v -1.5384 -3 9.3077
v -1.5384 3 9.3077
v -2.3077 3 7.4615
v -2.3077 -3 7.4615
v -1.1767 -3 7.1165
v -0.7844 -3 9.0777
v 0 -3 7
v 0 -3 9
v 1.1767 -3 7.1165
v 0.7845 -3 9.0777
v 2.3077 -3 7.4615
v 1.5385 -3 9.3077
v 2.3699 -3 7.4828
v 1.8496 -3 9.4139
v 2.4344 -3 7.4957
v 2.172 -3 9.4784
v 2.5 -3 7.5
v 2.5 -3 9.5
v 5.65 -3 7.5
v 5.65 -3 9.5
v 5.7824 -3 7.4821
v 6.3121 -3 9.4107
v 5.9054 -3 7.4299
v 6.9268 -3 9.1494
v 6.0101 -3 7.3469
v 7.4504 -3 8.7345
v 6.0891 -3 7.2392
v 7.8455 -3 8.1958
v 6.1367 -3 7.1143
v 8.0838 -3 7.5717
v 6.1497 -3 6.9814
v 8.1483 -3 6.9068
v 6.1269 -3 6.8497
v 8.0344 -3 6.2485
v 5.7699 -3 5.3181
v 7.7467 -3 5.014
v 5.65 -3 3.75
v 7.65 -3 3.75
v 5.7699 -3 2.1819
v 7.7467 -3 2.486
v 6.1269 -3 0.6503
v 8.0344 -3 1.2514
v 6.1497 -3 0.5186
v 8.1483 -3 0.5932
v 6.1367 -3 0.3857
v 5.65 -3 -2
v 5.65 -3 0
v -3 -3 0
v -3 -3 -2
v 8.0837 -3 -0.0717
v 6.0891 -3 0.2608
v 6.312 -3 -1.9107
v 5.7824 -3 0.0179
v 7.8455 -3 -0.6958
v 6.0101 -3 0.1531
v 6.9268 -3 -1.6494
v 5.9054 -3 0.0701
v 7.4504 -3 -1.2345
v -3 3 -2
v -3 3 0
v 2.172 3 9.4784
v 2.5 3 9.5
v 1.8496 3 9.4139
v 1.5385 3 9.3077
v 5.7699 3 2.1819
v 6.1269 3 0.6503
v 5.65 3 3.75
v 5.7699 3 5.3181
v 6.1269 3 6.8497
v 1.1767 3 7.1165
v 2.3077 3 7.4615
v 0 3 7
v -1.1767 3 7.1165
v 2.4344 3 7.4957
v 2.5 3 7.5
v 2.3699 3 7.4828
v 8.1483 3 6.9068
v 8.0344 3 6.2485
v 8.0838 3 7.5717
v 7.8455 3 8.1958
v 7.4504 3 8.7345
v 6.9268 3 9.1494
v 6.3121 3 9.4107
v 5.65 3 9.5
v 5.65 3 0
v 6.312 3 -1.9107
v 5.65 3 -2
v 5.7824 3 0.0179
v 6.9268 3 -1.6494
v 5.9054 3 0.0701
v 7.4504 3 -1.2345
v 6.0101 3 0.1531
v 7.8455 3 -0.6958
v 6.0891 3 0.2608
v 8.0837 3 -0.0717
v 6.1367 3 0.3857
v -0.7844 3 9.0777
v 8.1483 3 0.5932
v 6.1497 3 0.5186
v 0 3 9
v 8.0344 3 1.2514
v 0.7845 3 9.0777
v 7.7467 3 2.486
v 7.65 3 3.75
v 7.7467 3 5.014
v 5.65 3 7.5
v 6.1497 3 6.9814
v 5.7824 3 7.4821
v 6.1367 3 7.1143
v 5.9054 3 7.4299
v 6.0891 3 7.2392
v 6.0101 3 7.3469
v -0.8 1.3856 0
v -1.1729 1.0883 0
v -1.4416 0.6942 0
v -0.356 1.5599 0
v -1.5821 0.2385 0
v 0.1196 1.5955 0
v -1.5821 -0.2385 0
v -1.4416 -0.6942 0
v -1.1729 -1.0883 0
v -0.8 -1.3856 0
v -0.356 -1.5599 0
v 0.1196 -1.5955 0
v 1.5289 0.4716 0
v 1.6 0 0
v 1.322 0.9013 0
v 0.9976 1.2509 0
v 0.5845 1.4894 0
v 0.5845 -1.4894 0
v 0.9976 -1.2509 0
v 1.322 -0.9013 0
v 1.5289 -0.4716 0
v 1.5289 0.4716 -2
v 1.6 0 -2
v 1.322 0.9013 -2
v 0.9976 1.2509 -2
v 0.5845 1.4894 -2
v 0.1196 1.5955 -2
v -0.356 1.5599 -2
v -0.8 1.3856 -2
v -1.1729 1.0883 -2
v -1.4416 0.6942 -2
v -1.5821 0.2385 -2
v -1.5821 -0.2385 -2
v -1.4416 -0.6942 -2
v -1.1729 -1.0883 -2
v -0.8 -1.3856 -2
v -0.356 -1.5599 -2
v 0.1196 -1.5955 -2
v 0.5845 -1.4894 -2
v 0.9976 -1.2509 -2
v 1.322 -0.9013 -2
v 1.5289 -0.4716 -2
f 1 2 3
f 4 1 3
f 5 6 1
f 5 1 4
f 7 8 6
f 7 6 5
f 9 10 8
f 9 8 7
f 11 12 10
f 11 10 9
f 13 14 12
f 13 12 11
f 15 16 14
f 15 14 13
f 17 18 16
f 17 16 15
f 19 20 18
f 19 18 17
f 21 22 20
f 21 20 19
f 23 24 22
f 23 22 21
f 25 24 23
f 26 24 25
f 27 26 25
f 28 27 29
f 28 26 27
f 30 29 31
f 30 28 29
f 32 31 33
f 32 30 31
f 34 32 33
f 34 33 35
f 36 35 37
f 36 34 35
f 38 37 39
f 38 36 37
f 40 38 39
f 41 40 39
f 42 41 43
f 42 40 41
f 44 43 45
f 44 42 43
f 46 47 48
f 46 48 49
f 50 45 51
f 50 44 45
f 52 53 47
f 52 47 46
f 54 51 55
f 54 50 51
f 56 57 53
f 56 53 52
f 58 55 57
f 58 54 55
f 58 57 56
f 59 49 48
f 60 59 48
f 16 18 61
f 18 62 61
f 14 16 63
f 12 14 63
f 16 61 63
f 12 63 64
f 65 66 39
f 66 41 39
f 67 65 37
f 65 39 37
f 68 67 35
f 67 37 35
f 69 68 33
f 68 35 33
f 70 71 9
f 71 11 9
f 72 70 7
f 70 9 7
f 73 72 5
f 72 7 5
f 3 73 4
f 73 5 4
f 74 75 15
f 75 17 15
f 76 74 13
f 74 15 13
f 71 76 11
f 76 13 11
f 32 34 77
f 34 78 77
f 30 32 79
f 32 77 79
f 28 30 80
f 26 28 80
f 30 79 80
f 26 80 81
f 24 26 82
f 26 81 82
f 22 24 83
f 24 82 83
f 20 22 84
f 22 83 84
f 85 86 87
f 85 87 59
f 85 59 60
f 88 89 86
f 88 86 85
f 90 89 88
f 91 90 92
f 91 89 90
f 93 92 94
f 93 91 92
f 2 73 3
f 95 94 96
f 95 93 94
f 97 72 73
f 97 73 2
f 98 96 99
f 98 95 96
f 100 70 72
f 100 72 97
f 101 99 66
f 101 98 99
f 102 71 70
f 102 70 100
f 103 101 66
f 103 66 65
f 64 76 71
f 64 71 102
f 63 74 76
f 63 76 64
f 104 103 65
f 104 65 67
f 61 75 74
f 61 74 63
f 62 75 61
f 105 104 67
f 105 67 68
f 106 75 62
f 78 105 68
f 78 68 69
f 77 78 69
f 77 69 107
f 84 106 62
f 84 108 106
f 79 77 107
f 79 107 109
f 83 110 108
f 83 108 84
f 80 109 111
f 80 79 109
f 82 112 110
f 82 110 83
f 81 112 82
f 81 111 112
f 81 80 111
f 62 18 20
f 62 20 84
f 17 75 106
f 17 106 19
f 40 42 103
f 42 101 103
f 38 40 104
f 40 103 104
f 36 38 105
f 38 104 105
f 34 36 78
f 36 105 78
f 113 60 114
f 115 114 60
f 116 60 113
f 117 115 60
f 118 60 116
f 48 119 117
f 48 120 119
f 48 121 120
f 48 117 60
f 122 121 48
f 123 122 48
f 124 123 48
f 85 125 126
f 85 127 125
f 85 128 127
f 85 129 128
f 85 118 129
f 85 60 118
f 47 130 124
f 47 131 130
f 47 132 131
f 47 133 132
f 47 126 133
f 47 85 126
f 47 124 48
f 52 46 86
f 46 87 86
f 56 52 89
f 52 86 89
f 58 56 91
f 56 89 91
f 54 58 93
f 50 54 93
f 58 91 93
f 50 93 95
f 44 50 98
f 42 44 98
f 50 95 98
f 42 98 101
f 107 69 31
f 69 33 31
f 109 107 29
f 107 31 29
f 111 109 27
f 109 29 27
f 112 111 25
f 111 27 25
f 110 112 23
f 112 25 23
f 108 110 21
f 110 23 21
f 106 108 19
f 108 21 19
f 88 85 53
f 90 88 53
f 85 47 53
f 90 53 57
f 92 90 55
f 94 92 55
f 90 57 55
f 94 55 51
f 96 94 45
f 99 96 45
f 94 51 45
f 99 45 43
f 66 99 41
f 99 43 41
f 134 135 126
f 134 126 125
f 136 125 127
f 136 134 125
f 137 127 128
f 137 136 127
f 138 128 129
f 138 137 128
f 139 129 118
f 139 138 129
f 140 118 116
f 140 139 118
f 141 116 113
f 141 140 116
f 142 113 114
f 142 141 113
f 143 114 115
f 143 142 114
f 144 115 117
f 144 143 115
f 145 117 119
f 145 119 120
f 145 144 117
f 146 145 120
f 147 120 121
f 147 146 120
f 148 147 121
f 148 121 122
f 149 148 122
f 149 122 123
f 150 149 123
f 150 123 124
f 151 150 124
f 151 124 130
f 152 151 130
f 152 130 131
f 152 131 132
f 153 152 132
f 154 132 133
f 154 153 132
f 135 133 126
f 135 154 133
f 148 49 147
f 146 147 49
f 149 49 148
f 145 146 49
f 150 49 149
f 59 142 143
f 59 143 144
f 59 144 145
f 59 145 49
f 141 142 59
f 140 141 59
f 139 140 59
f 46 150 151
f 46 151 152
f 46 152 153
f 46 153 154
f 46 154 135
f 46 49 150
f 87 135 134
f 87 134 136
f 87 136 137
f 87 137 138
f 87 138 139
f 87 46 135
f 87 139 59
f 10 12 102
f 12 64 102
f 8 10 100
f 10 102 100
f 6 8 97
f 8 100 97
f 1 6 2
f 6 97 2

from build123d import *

# Parameters (mm, degrees)
SKETCH001_W = 6
SKETCH001_H = 2
SKETCH002_R = 1.6
HOLE_DEPTH  = 2
HOLE_TIPS_R = 1.6


with BuildPart() as part:
    # AdditivePipe: sweep along a path in Sketch
    with BuildLine(Plane.XZ) as additivepipe_path:
        Line((-3, 0), (5.65, 0))
        ThreePointArc((5.65, 0), (6.053202, 0.204318), (6.126879, 0.650289))
        ThreePointArc((6.126879, 0.650289), (5.65, 3.75), (6.126879, 6.849711))
        ThreePointArc((6.126879, 6.849711), (6.053202, 7.295682), (5.65, 7.5))
        Line((5.65, 7.5), (2.5, 7.5))
        ThreePointArc((2.5, 7.5), (2.401942, 7.49029), (2.307692, 7.461538))
        ThreePointArc((2.307692, 7.461538), (0, 7), (-2.307692, 7.461538))
    # Sketch001 → AdditivePipe (sweep)
    with BuildSketch(Plane.YZ):
        with Locations((0, -1)):
            Rectangle(SKETCH001_W, SKETCH001_H)
    sweep(path=additivepipe_path.line)

    # Sketch002 (on DatumPlane) → Hole (cut)
    with BuildSketch(Plane.XY.offset(-2)):
        Circle(SKETCH002_R)
    extrude(amount=HOLE_DEPTH, mode=Mode.SUBTRACT)

    # Hole tips → Hole tip 1 section 0
    with BuildSketch(Plane.XY, mode=Mode.PRIVATE) as hole_tip_1_s0:
        Circle(HOLE_TIPS_R)
    loft([hole_tip_1_s0.sketch, Vertex(0, 0, 0.961377)], mode=Mode.SUBTRACT)


solid = part.part
